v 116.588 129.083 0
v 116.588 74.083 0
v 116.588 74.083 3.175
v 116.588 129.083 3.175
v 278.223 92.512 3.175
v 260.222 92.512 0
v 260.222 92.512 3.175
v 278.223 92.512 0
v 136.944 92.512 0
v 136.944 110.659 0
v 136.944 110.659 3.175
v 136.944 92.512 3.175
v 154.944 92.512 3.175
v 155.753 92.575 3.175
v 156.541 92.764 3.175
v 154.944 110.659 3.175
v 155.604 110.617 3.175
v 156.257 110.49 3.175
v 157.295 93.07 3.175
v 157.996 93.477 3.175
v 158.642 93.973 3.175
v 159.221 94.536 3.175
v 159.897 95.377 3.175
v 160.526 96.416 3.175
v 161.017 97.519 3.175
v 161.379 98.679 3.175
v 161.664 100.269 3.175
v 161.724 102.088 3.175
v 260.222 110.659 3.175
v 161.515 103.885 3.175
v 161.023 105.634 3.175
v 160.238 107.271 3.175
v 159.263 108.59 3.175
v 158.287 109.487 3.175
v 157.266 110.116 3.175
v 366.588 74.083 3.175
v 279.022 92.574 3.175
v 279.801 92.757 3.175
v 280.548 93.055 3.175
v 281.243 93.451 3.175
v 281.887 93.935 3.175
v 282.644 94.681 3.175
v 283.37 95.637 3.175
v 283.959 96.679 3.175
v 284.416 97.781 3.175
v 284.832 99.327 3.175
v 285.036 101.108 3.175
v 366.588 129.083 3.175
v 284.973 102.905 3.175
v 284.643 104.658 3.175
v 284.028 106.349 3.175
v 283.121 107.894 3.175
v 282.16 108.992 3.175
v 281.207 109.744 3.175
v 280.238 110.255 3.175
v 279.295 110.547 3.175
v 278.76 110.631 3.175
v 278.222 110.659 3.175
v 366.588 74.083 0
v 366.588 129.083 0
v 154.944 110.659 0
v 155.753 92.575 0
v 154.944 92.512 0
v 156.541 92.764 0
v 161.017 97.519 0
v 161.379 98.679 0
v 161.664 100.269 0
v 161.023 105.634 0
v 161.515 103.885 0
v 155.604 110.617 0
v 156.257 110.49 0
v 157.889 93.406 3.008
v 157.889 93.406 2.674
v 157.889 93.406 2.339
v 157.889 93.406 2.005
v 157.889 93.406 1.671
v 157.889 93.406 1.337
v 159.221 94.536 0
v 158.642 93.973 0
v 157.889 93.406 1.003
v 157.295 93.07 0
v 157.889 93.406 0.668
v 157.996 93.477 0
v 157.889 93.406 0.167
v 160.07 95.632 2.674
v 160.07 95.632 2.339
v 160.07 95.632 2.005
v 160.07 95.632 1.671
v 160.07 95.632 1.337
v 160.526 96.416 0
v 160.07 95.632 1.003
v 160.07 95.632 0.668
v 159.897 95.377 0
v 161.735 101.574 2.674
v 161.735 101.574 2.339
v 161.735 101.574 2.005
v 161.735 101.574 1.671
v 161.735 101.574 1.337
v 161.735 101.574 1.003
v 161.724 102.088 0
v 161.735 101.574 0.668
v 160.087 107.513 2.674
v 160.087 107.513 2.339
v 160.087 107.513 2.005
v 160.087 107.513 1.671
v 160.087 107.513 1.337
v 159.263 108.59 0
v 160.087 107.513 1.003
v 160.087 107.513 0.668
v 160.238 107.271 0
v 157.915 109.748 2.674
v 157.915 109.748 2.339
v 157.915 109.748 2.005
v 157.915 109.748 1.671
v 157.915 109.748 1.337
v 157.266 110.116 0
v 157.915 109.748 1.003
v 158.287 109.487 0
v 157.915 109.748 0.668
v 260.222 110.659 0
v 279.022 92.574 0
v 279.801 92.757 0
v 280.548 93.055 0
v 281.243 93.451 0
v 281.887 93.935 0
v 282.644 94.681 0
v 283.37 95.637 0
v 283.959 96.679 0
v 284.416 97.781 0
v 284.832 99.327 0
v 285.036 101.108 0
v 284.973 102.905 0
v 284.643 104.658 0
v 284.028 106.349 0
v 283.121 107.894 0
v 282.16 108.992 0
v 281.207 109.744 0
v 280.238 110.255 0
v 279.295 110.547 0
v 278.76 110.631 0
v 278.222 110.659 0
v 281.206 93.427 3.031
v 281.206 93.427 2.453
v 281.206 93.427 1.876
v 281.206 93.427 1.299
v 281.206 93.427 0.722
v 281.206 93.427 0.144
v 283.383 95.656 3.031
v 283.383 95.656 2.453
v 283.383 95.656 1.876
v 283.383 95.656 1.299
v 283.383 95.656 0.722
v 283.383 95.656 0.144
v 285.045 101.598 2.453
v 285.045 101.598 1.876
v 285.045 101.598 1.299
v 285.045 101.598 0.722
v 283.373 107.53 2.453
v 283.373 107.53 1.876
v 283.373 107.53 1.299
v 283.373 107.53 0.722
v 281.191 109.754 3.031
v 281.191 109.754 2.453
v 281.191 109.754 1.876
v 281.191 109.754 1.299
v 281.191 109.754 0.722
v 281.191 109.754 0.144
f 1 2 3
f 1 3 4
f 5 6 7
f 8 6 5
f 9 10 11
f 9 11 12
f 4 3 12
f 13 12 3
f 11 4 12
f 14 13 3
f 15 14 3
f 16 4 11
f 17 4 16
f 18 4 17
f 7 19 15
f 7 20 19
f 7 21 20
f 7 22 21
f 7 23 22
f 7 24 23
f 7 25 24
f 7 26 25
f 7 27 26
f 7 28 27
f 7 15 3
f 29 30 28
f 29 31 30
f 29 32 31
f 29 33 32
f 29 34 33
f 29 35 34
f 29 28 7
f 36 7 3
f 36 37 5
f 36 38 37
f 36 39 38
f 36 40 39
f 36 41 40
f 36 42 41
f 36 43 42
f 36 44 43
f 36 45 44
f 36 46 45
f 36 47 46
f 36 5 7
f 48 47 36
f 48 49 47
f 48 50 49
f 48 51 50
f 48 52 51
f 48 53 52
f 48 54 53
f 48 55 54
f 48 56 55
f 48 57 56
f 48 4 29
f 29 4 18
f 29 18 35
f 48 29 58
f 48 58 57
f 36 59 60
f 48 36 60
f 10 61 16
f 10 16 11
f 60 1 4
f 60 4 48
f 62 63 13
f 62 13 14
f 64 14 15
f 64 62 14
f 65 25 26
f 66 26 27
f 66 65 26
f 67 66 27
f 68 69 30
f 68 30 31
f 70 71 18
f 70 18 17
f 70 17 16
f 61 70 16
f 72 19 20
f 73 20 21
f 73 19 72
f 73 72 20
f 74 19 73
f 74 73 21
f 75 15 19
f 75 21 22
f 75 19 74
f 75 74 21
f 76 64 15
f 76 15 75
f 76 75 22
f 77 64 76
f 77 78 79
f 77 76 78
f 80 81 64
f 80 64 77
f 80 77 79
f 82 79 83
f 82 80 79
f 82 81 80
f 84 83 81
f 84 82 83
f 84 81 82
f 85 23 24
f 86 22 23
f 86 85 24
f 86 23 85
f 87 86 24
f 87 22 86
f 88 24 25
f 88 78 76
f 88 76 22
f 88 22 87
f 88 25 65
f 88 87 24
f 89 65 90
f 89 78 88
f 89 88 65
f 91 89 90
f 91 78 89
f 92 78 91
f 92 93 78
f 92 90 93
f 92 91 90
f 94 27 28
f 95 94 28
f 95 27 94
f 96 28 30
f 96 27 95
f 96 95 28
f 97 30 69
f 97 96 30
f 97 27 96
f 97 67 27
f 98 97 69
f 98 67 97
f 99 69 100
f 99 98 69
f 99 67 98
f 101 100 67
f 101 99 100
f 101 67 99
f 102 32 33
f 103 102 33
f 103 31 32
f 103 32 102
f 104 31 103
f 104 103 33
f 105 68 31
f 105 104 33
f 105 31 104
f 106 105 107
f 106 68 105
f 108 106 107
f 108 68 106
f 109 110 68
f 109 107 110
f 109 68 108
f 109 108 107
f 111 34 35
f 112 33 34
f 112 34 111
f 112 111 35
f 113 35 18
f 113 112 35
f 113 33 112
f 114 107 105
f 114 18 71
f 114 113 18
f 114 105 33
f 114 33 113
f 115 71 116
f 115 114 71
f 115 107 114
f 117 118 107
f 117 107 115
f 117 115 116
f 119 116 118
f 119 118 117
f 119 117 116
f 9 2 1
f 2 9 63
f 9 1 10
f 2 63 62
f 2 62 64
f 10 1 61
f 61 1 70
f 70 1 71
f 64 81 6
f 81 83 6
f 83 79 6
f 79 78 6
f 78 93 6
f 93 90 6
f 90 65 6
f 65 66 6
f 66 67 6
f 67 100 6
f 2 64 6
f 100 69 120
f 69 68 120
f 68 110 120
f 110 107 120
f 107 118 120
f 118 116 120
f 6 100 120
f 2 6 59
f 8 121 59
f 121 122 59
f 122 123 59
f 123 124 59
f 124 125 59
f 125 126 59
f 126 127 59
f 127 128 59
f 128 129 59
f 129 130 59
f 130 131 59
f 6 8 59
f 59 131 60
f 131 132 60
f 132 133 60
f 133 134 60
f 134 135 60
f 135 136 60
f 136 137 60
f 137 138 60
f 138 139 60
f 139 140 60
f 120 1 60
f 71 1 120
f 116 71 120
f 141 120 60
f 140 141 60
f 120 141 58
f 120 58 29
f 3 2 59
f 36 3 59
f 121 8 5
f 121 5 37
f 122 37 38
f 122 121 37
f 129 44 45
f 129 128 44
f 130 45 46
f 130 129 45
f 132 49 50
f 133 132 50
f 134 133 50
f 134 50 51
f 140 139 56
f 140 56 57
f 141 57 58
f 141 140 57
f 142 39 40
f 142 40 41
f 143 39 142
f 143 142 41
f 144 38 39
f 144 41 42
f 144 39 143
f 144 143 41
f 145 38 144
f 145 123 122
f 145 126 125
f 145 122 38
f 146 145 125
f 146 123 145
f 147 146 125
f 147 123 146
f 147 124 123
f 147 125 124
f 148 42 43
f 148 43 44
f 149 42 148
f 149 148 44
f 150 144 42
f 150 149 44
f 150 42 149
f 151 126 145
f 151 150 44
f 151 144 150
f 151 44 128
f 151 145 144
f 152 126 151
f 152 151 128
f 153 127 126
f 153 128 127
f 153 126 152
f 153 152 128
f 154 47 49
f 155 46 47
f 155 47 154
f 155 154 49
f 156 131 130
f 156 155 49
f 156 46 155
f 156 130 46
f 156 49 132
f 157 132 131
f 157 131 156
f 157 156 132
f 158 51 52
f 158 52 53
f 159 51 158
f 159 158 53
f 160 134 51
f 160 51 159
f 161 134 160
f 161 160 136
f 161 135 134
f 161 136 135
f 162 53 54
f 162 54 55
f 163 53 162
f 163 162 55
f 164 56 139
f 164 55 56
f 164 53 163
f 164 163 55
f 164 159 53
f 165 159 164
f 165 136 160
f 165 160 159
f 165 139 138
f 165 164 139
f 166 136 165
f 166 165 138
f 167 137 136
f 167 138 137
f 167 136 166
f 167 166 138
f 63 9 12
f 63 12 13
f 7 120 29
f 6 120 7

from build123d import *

# Parameters (mm, degrees)
SKETCH1_W           = 250
SKETCH1_H           = 55
BOSS_EXTRUDE1_DEPTH = 3.175


with BuildPart() as part:
    # Sketch1 → Boss-Extrude1 (new body)
    with BuildSketch(Plane.XY):
        with Locations((241.58829827, 101.583069701)):
            Rectangle(SKETCH1_W, SKETCH1_H)
        with BuildLine():
            Line((154.944441507, 110.659419863), (136.944461656, 110.659419863))
            Line((136.944461656, 110.659419863), (136.944461656, 92.511783047))
            Line((136.944461656, 92.511783047), (154.944461656, 92.511783047))
            add(Edge.make_bspline(
                [(154.944461656, 92.511783047), (155.465580761, 92.511783047), (155.973562735, 92.589394234), (156.720262524, 92.818020166), (156.967329601, 92.914210046), (157.440562636, 93.137067615), (157.668709975, 93.264289684), (158.109361081, 93.547905878), (158.322848527, 93.705295338), (158.725811926, 94.039877695), (158.91636517, 94.217573511), (159.277979375, 94.591523132), (159.449028618, 94.787788094), (159.773040585, 95.19753762), (159.9266746, 95.412129059), (160.355672211, 96.071269052), (160.599679107, 96.530127084), (161.016221353, 97.480916259), (161.18895181, 97.974269403), (161.602577216, 99.493122012), (161.733592644, 100.524931205), (161.735557125, 102.623122345), (161.605853876, 103.65367904), (161.200790672, 105.159416327), (161.028182443, 105.658994331), (160.612184007, 106.616383577), (160.369184421, 107.075786107), (159.803943699, 107.950913477), (159.477972126, 108.370019434), (158.755362198, 109.122883671), (158.357777017, 109.46022215), (157.472283398, 110.03638962), (157.002434247, 110.263188923), (156.251245807, 110.498433872), (155.99218216, 110.558924387), (155.475823647, 110.638710894), (155.216383747, 110.658836286), (154.951945719, 110.659415753), (154.948193937, 110.659419863), (154.944441507, 110.659419863)],
                knots=[0.000439911, 0.000439911, 0.000439911, 0.000439911, 0.03125, 0.03125, 0.046875, 0.046875, 0.0625, 0.0625, 0.078125, 0.078125, 0.09375, 0.09375, 0.109375, 0.109375, 0.125, 0.125, 0.15625, 0.15625, 0.1875, 0.1875, 0.25, 0.25, 0.3125, 0.3125, 0.34375, 0.34375, 0.375, 0.375, 0.40625, 0.40625, 0.4375, 0.4375, 0.46875, 0.46875, 0.484375, 0.484375, 0.5, 0.5, 0.500224833, 0.500224833, 0.500224833, 0.500224833], degree=3))
        make_face(mode=Mode.SUBTRACT)
        with BuildLine():
            Line((278.222355303, 110.659419984), (260.222355303, 110.659419984))
            Line((260.222355303, 110.659419984), (260.222355303, 92.511784216))
            Line((260.222355303, 92.511784216), (278.222671977, 92.511784216))
            add(Edge.make_bspline(
                [(278.222671977, 92.511784216), (278.229937143, 92.511784216), (278.237201457, 92.511799646), (278.773421896, 92.514079257), (279.288142612, 92.596096823), (280.040047699, 92.832172325), (280.286553449, 92.929971913), (280.75860243, 93.155562646), (280.986126812, 93.283918002), (281.425506637, 93.569311707), (281.638411532, 93.727382623), (282.040609192, 94.063197756), (282.23082338, 94.241332646), (282.591831943, 94.615849486), (282.762614605, 94.81224244), (283.086151949, 95.22196763), (283.239528043, 95.436304512), (283.668884519, 96.096080467), (283.913097501, 96.555038053), (284.329853528, 97.5055387), (284.50233093, 97.997517385), (284.916425114, 99.517971017), (285.04637802, 100.549745307), (285.044814782, 102.121799944), (285.010624567, 102.644051201), (284.87506084, 103.671879074), (284.773756367, 104.179515711), (284.56808419, 104.930912138), (284.490533245, 105.179693519), (284.316216828, 105.673658252), (284.219380859, 105.918716085), (283.90344552, 106.635729238), (283.657868712, 107.093856456), (283.088219022, 107.965462), (282.760173435, 108.382711445), (282.033463395, 109.132471136), (281.634553418, 109.467765519), (280.748361649, 110.039964654), (280.276240557, 110.266288645), (279.525605581, 110.499795693), (279.266245361, 110.559993759), (278.749131979, 110.639237799), (278.489592579, 110.659075845), (278.226841712, 110.659418521), (278.224598593, 110.659419984), (278.222355303, 110.659419984)],
                knots=[0.999570895, 0.999570895, 0.999570895, 0.999570895, 1, 1, 1.03125, 1.03125, 1.046875, 1.046875, 1.0625, 1.0625, 1.078125, 1.078125, 1.09375, 1.09375, 1.109375, 1.109375, 1.125, 1.125, 1.15625, 1.15625, 1.1875, 1.1875, 1.25, 1.25, 1.28125, 1.28125, 1.3125, 1.3125, 1.328125, 1.328125, 1.34375, 1.34375, 1.375, 1.375, 1.40625, 1.40625, 1.4375, 1.4375, 1.46875, 1.46875, 1.484375, 1.484375, 1.5, 1.5, 1.50013453, 1.50013453, 1.50013453, 1.50013453], degree=3))
        make_face(mode=Mode.SUBTRACT)
    extrude(amount=BOSS_EXTRUDE1_DEPTH)


solid = part.part
